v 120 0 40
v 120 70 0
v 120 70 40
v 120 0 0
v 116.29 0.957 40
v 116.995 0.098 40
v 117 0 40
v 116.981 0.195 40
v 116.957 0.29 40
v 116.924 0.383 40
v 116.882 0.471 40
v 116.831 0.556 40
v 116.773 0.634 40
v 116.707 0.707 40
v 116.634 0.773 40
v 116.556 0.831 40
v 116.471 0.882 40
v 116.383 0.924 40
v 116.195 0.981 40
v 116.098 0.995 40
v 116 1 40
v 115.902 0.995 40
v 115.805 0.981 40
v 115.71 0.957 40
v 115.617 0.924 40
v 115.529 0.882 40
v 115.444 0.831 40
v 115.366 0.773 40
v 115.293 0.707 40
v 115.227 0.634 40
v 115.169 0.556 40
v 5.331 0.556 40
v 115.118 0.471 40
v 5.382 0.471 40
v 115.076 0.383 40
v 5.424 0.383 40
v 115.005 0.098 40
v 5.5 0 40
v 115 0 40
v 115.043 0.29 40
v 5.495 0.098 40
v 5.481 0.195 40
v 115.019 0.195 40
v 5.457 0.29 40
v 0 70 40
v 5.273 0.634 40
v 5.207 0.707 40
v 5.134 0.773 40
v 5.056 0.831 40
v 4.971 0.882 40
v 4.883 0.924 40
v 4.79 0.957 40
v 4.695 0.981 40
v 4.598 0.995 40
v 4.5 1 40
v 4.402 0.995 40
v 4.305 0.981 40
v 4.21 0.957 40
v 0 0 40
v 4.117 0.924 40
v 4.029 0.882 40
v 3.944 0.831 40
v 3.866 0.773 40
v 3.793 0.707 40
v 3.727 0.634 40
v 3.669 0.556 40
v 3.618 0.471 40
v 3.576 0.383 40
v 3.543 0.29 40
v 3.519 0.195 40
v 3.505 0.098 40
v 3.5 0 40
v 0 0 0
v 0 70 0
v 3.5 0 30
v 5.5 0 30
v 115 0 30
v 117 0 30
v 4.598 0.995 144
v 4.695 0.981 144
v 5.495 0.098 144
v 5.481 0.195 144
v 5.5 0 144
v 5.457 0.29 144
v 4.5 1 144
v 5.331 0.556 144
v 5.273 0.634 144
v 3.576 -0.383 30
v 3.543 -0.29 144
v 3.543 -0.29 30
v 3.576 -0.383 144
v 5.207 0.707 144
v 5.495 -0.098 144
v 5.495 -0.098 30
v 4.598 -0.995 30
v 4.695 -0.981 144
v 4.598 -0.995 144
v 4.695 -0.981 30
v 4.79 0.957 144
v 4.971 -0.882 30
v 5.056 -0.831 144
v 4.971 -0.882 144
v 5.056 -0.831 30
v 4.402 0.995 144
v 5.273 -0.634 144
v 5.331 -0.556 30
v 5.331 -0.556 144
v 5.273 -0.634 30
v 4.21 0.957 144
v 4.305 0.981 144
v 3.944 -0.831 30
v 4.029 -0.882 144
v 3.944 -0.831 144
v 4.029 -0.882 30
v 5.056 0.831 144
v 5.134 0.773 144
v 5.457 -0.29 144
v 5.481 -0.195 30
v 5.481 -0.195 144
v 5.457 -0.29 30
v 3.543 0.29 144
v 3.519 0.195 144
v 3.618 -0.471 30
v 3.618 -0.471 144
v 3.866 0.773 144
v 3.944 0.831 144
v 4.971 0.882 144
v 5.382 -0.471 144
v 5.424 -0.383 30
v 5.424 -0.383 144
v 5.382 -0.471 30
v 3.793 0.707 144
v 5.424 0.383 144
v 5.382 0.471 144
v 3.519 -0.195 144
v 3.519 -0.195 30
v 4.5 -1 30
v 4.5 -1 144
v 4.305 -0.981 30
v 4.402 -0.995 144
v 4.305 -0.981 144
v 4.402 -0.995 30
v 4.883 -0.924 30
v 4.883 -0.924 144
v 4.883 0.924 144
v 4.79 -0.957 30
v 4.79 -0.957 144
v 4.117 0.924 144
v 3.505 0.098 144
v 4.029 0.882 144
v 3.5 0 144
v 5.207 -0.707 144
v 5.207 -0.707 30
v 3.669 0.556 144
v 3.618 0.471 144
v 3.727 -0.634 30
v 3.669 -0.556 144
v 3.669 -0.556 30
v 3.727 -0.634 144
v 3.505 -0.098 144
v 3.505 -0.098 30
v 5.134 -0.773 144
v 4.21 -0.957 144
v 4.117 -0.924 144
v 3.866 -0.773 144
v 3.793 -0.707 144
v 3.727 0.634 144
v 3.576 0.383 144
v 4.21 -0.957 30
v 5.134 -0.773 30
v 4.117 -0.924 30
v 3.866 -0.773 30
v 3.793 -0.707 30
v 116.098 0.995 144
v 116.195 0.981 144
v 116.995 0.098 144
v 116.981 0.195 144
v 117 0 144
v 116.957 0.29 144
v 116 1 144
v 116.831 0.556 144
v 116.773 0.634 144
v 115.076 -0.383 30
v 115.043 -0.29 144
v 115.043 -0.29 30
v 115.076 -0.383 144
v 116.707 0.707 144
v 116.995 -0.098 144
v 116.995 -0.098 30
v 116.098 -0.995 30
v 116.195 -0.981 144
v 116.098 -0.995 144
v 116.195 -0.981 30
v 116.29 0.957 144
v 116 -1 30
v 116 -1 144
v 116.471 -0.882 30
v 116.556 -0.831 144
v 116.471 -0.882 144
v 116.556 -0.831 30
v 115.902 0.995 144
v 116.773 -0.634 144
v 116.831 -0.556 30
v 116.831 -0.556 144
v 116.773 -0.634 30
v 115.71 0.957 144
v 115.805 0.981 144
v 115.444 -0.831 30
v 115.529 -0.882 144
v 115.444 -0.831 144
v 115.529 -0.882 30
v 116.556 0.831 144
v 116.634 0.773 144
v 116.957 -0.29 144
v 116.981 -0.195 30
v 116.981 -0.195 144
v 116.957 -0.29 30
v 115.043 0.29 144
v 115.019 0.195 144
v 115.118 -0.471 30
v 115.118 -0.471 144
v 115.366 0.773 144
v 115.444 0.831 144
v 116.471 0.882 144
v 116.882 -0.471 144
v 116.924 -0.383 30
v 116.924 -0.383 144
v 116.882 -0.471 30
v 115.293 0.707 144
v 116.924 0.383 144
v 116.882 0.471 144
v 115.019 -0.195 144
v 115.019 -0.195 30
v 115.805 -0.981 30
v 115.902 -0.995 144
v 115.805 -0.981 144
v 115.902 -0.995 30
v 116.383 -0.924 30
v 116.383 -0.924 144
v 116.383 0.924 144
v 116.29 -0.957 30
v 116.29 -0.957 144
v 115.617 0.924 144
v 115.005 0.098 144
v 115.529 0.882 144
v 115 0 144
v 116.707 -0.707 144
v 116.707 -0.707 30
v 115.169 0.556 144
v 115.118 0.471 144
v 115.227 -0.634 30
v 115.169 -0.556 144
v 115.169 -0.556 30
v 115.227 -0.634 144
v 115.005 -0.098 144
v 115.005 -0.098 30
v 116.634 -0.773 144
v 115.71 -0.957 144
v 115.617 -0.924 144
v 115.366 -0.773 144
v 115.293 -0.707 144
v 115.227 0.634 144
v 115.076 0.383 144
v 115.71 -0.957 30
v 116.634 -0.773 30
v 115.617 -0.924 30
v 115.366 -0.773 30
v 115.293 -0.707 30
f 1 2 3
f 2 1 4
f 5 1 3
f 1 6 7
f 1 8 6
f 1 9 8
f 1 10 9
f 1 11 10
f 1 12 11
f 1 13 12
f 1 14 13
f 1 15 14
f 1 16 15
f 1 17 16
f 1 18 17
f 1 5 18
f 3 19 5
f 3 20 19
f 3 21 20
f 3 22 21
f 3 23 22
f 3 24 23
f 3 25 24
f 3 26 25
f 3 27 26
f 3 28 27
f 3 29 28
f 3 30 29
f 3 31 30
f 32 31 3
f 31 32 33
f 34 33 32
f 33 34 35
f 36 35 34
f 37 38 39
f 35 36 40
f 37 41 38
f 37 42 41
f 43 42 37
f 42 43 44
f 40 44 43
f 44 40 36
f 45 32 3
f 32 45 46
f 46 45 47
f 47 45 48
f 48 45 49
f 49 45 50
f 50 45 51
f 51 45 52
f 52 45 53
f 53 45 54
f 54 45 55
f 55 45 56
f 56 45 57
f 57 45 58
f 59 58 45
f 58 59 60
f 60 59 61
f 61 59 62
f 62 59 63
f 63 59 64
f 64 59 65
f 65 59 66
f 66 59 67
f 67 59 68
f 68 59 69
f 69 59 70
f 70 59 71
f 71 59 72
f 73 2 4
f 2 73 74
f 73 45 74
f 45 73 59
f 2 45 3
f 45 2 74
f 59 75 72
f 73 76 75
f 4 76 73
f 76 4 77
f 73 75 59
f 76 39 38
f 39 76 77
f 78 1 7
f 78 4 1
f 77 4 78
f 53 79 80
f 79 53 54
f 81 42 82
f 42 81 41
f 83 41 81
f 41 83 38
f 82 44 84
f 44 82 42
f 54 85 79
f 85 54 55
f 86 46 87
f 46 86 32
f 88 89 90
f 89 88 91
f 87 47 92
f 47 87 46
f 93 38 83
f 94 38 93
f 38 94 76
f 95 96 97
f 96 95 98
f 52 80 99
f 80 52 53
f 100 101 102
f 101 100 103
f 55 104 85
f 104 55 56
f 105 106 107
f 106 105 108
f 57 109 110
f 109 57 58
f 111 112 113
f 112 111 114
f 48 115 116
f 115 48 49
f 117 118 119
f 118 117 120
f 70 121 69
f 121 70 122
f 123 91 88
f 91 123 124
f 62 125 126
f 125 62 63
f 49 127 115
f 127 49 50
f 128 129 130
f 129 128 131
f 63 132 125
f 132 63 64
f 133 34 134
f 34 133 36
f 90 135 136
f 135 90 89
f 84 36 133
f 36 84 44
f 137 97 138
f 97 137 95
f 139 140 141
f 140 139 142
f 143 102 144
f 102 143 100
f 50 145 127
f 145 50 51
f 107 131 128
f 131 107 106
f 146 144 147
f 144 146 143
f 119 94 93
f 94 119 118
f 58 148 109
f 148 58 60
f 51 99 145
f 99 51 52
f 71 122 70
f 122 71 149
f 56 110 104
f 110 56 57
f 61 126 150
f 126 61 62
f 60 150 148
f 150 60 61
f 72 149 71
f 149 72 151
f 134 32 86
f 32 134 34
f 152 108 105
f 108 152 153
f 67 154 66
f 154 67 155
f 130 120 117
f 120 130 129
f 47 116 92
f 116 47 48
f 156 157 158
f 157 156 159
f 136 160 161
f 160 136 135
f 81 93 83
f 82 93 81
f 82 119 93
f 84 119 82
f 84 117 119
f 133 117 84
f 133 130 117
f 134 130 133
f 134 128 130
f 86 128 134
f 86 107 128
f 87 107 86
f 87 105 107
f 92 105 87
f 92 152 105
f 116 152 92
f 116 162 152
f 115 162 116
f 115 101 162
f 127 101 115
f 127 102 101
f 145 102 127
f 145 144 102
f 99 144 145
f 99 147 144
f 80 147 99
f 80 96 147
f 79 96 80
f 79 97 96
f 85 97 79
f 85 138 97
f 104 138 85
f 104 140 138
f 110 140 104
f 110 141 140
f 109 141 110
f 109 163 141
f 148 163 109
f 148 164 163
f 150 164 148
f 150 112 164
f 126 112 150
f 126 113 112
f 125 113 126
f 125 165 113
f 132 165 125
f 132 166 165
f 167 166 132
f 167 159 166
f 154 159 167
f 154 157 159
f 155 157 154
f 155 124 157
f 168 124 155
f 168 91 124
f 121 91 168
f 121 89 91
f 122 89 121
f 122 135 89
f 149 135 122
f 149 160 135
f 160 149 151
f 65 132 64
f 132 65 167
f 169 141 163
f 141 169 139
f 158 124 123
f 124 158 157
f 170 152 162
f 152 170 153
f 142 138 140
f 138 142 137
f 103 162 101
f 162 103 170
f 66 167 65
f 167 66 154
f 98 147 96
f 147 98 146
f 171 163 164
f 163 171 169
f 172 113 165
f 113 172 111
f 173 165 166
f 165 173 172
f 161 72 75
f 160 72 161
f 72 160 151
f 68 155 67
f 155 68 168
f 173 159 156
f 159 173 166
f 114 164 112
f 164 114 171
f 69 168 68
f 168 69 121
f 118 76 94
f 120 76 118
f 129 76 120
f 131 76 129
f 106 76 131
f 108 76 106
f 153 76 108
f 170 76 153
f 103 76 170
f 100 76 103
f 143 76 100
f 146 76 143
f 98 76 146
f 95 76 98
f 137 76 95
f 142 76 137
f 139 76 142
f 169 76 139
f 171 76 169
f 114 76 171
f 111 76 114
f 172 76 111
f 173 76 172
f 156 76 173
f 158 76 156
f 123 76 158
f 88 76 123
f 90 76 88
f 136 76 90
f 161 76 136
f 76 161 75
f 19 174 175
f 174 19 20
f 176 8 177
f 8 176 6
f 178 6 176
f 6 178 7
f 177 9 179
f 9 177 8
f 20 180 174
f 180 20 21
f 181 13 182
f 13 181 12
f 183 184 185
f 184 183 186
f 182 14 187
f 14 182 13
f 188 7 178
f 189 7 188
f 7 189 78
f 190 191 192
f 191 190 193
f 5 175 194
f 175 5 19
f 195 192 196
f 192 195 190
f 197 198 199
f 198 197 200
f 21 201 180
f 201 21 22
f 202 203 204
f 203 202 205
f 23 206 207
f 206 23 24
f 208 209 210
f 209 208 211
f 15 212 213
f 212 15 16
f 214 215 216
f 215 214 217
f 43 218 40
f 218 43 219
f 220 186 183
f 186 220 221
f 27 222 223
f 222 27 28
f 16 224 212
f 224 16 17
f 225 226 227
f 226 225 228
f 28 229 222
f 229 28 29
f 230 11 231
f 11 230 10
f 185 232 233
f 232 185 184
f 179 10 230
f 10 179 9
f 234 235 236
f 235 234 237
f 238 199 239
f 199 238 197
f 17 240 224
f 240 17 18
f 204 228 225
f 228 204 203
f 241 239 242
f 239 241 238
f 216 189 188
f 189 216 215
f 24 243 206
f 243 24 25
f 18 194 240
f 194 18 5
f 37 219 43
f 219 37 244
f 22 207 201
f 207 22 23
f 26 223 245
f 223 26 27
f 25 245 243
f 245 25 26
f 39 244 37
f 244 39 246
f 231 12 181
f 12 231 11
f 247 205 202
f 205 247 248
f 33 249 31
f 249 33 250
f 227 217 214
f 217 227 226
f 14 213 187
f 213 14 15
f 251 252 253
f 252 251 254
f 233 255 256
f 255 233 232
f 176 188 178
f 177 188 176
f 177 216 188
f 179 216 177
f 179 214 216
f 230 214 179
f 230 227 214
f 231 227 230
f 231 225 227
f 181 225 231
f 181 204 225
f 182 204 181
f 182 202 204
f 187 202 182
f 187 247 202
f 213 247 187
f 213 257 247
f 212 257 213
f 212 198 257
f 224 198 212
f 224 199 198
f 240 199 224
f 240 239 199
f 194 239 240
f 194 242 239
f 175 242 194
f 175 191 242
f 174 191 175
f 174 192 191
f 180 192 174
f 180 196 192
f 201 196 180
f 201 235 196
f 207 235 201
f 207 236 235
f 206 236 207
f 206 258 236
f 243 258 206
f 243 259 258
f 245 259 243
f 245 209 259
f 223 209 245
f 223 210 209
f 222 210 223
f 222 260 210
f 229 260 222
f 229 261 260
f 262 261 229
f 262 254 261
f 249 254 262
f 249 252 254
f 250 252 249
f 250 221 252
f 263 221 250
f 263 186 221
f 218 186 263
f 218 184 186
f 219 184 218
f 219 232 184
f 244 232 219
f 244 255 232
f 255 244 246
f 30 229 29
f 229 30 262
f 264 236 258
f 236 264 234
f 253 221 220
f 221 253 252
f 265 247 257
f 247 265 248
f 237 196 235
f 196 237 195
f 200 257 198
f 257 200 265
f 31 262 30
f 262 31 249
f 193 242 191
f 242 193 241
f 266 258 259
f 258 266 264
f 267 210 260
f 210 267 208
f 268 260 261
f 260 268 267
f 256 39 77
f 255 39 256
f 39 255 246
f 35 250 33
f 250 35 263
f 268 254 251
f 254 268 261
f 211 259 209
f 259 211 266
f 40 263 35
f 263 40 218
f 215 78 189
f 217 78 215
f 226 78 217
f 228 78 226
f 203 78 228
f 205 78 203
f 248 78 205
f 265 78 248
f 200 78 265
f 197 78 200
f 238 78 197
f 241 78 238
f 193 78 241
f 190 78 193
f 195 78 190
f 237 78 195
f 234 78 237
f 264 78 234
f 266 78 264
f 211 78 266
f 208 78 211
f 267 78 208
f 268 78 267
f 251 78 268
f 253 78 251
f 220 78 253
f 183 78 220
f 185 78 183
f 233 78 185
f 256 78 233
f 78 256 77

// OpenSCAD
// Mini Horizontal Gel Electrophoresis Buffer Tank
// Outer dimensions: 120 x 70 x 40 mm
// Wall thickness: 3 mm
// Floor thickness: 3 mm
// Inner platform: 60 mm long, full width, 10 mm high above inner floor

$fn = 64;

// Outer Dimensions
X_OUT = 120;
Y_OUT = 70;
Z_OUT = 40;

// Thicknesses
wall_thick = 3;
floor_thick = 3;

// Inner Dimensions (calculated from outer and thicknesses)
X_IN = X_OUT - 2 * wall_thick;
Y_IN = Y_OUT - 2 * wall_thick;
Z_IN = Z_OUT - floor_thick; // Open top, so height is just Z_OUT - floor

// Platform Dimensions
plat_len = 60;
plat_width = Y_IN;
plat_height = 10; // Height above inner floor

// Electrode Hole Dimensions
hole_d = 2;
hole_y = 0;
hole_z = 30;

// Helper to create the main tank shell
module tank_shell() {
    // Calculate inner X and Y positions (centered)
    x_in_start = (X_OUT - X_IN) / 2;
    y_in_start = (Y_OUT - Y_IN) / 2;
    
    // Calculate platform Z position relative to bottom
    z_plat_bottom = floor_thick;
    z_plat_top = z_plat_bottom + plat_height;
    
    // Platform X position (centered)
    x_plat_start = (X_OUT - plat_len) / 2;
    
    // Build the solid tank with the platform inside
    union() {
        // 1. The main outer block (including floor)
        translate([0, 0, 0]) 
            cube([X_OUT, Y_OUT, Z_OUT]);
        
        // 2. Cut out the inner volume (walls and empty space)
        // We subtract the inner box, but we must be careful not to cut the platform
        // Strategy: Subtract the inner volume in two parts or use a complex difference.
        // Easier approach: Build the walls and floor as positive geometry, then subtract the empty space.
        
        // Let's rebuild using positive geometry for the tank body to ensure clean walls
        // Floor
        translate([x_in_start, y_in_start, 0]) 
            cube([X_IN, Y_IN, floor_thick]);
            
        // Side Walls (Left, Right, Front, Back)
        // Left Wall (at x_in_start)
        translate([x_in_start, y_in_start, floor_thick]) 
            cube([wall_thick, Y_IN, Z_IN]);
            
        // Right Wall (at x_out - wall_thick)
        translate([X_OUT - wall_thick, y_in_start, floor_thick]) 
            cube([wall_thick, Y_IN, Z_IN]);
            
        // Front Wall (at y_in_start)
        translate([x_in_start, y_in_start, floor_thick]) 
            cube([X_IN, wall_thick, Z_IN]);
            
        // Back Wall (at y_out - wall_thick)
        translate([x_in_start, Y_OUT - wall_thick, floor_thick]) 
            cube([X_IN, wall_thick, Z_IN]);
            
        // 3. The Raised Platform
        translate([x_plat_start, y_in_start, z_plat_bottom]) 
            cube([plat_len, plat_width, plat_height]);
    }
    
    // Now subtract the electrode holes
    // Hole 1: Left end wall
    translate([x_in_start + wall_thick/2, hole_y, hole_z]) 
        cylinder(h = X_IN, d = hole_d);
        
    // Hole 2: Right end wall
    translate([X_OUT - wall_thick - hole_d/2, hole_y, hole_z]) 
        cylinder(h = X_IN, d = hole_d);
}

// Generate the part
tank_shell();
